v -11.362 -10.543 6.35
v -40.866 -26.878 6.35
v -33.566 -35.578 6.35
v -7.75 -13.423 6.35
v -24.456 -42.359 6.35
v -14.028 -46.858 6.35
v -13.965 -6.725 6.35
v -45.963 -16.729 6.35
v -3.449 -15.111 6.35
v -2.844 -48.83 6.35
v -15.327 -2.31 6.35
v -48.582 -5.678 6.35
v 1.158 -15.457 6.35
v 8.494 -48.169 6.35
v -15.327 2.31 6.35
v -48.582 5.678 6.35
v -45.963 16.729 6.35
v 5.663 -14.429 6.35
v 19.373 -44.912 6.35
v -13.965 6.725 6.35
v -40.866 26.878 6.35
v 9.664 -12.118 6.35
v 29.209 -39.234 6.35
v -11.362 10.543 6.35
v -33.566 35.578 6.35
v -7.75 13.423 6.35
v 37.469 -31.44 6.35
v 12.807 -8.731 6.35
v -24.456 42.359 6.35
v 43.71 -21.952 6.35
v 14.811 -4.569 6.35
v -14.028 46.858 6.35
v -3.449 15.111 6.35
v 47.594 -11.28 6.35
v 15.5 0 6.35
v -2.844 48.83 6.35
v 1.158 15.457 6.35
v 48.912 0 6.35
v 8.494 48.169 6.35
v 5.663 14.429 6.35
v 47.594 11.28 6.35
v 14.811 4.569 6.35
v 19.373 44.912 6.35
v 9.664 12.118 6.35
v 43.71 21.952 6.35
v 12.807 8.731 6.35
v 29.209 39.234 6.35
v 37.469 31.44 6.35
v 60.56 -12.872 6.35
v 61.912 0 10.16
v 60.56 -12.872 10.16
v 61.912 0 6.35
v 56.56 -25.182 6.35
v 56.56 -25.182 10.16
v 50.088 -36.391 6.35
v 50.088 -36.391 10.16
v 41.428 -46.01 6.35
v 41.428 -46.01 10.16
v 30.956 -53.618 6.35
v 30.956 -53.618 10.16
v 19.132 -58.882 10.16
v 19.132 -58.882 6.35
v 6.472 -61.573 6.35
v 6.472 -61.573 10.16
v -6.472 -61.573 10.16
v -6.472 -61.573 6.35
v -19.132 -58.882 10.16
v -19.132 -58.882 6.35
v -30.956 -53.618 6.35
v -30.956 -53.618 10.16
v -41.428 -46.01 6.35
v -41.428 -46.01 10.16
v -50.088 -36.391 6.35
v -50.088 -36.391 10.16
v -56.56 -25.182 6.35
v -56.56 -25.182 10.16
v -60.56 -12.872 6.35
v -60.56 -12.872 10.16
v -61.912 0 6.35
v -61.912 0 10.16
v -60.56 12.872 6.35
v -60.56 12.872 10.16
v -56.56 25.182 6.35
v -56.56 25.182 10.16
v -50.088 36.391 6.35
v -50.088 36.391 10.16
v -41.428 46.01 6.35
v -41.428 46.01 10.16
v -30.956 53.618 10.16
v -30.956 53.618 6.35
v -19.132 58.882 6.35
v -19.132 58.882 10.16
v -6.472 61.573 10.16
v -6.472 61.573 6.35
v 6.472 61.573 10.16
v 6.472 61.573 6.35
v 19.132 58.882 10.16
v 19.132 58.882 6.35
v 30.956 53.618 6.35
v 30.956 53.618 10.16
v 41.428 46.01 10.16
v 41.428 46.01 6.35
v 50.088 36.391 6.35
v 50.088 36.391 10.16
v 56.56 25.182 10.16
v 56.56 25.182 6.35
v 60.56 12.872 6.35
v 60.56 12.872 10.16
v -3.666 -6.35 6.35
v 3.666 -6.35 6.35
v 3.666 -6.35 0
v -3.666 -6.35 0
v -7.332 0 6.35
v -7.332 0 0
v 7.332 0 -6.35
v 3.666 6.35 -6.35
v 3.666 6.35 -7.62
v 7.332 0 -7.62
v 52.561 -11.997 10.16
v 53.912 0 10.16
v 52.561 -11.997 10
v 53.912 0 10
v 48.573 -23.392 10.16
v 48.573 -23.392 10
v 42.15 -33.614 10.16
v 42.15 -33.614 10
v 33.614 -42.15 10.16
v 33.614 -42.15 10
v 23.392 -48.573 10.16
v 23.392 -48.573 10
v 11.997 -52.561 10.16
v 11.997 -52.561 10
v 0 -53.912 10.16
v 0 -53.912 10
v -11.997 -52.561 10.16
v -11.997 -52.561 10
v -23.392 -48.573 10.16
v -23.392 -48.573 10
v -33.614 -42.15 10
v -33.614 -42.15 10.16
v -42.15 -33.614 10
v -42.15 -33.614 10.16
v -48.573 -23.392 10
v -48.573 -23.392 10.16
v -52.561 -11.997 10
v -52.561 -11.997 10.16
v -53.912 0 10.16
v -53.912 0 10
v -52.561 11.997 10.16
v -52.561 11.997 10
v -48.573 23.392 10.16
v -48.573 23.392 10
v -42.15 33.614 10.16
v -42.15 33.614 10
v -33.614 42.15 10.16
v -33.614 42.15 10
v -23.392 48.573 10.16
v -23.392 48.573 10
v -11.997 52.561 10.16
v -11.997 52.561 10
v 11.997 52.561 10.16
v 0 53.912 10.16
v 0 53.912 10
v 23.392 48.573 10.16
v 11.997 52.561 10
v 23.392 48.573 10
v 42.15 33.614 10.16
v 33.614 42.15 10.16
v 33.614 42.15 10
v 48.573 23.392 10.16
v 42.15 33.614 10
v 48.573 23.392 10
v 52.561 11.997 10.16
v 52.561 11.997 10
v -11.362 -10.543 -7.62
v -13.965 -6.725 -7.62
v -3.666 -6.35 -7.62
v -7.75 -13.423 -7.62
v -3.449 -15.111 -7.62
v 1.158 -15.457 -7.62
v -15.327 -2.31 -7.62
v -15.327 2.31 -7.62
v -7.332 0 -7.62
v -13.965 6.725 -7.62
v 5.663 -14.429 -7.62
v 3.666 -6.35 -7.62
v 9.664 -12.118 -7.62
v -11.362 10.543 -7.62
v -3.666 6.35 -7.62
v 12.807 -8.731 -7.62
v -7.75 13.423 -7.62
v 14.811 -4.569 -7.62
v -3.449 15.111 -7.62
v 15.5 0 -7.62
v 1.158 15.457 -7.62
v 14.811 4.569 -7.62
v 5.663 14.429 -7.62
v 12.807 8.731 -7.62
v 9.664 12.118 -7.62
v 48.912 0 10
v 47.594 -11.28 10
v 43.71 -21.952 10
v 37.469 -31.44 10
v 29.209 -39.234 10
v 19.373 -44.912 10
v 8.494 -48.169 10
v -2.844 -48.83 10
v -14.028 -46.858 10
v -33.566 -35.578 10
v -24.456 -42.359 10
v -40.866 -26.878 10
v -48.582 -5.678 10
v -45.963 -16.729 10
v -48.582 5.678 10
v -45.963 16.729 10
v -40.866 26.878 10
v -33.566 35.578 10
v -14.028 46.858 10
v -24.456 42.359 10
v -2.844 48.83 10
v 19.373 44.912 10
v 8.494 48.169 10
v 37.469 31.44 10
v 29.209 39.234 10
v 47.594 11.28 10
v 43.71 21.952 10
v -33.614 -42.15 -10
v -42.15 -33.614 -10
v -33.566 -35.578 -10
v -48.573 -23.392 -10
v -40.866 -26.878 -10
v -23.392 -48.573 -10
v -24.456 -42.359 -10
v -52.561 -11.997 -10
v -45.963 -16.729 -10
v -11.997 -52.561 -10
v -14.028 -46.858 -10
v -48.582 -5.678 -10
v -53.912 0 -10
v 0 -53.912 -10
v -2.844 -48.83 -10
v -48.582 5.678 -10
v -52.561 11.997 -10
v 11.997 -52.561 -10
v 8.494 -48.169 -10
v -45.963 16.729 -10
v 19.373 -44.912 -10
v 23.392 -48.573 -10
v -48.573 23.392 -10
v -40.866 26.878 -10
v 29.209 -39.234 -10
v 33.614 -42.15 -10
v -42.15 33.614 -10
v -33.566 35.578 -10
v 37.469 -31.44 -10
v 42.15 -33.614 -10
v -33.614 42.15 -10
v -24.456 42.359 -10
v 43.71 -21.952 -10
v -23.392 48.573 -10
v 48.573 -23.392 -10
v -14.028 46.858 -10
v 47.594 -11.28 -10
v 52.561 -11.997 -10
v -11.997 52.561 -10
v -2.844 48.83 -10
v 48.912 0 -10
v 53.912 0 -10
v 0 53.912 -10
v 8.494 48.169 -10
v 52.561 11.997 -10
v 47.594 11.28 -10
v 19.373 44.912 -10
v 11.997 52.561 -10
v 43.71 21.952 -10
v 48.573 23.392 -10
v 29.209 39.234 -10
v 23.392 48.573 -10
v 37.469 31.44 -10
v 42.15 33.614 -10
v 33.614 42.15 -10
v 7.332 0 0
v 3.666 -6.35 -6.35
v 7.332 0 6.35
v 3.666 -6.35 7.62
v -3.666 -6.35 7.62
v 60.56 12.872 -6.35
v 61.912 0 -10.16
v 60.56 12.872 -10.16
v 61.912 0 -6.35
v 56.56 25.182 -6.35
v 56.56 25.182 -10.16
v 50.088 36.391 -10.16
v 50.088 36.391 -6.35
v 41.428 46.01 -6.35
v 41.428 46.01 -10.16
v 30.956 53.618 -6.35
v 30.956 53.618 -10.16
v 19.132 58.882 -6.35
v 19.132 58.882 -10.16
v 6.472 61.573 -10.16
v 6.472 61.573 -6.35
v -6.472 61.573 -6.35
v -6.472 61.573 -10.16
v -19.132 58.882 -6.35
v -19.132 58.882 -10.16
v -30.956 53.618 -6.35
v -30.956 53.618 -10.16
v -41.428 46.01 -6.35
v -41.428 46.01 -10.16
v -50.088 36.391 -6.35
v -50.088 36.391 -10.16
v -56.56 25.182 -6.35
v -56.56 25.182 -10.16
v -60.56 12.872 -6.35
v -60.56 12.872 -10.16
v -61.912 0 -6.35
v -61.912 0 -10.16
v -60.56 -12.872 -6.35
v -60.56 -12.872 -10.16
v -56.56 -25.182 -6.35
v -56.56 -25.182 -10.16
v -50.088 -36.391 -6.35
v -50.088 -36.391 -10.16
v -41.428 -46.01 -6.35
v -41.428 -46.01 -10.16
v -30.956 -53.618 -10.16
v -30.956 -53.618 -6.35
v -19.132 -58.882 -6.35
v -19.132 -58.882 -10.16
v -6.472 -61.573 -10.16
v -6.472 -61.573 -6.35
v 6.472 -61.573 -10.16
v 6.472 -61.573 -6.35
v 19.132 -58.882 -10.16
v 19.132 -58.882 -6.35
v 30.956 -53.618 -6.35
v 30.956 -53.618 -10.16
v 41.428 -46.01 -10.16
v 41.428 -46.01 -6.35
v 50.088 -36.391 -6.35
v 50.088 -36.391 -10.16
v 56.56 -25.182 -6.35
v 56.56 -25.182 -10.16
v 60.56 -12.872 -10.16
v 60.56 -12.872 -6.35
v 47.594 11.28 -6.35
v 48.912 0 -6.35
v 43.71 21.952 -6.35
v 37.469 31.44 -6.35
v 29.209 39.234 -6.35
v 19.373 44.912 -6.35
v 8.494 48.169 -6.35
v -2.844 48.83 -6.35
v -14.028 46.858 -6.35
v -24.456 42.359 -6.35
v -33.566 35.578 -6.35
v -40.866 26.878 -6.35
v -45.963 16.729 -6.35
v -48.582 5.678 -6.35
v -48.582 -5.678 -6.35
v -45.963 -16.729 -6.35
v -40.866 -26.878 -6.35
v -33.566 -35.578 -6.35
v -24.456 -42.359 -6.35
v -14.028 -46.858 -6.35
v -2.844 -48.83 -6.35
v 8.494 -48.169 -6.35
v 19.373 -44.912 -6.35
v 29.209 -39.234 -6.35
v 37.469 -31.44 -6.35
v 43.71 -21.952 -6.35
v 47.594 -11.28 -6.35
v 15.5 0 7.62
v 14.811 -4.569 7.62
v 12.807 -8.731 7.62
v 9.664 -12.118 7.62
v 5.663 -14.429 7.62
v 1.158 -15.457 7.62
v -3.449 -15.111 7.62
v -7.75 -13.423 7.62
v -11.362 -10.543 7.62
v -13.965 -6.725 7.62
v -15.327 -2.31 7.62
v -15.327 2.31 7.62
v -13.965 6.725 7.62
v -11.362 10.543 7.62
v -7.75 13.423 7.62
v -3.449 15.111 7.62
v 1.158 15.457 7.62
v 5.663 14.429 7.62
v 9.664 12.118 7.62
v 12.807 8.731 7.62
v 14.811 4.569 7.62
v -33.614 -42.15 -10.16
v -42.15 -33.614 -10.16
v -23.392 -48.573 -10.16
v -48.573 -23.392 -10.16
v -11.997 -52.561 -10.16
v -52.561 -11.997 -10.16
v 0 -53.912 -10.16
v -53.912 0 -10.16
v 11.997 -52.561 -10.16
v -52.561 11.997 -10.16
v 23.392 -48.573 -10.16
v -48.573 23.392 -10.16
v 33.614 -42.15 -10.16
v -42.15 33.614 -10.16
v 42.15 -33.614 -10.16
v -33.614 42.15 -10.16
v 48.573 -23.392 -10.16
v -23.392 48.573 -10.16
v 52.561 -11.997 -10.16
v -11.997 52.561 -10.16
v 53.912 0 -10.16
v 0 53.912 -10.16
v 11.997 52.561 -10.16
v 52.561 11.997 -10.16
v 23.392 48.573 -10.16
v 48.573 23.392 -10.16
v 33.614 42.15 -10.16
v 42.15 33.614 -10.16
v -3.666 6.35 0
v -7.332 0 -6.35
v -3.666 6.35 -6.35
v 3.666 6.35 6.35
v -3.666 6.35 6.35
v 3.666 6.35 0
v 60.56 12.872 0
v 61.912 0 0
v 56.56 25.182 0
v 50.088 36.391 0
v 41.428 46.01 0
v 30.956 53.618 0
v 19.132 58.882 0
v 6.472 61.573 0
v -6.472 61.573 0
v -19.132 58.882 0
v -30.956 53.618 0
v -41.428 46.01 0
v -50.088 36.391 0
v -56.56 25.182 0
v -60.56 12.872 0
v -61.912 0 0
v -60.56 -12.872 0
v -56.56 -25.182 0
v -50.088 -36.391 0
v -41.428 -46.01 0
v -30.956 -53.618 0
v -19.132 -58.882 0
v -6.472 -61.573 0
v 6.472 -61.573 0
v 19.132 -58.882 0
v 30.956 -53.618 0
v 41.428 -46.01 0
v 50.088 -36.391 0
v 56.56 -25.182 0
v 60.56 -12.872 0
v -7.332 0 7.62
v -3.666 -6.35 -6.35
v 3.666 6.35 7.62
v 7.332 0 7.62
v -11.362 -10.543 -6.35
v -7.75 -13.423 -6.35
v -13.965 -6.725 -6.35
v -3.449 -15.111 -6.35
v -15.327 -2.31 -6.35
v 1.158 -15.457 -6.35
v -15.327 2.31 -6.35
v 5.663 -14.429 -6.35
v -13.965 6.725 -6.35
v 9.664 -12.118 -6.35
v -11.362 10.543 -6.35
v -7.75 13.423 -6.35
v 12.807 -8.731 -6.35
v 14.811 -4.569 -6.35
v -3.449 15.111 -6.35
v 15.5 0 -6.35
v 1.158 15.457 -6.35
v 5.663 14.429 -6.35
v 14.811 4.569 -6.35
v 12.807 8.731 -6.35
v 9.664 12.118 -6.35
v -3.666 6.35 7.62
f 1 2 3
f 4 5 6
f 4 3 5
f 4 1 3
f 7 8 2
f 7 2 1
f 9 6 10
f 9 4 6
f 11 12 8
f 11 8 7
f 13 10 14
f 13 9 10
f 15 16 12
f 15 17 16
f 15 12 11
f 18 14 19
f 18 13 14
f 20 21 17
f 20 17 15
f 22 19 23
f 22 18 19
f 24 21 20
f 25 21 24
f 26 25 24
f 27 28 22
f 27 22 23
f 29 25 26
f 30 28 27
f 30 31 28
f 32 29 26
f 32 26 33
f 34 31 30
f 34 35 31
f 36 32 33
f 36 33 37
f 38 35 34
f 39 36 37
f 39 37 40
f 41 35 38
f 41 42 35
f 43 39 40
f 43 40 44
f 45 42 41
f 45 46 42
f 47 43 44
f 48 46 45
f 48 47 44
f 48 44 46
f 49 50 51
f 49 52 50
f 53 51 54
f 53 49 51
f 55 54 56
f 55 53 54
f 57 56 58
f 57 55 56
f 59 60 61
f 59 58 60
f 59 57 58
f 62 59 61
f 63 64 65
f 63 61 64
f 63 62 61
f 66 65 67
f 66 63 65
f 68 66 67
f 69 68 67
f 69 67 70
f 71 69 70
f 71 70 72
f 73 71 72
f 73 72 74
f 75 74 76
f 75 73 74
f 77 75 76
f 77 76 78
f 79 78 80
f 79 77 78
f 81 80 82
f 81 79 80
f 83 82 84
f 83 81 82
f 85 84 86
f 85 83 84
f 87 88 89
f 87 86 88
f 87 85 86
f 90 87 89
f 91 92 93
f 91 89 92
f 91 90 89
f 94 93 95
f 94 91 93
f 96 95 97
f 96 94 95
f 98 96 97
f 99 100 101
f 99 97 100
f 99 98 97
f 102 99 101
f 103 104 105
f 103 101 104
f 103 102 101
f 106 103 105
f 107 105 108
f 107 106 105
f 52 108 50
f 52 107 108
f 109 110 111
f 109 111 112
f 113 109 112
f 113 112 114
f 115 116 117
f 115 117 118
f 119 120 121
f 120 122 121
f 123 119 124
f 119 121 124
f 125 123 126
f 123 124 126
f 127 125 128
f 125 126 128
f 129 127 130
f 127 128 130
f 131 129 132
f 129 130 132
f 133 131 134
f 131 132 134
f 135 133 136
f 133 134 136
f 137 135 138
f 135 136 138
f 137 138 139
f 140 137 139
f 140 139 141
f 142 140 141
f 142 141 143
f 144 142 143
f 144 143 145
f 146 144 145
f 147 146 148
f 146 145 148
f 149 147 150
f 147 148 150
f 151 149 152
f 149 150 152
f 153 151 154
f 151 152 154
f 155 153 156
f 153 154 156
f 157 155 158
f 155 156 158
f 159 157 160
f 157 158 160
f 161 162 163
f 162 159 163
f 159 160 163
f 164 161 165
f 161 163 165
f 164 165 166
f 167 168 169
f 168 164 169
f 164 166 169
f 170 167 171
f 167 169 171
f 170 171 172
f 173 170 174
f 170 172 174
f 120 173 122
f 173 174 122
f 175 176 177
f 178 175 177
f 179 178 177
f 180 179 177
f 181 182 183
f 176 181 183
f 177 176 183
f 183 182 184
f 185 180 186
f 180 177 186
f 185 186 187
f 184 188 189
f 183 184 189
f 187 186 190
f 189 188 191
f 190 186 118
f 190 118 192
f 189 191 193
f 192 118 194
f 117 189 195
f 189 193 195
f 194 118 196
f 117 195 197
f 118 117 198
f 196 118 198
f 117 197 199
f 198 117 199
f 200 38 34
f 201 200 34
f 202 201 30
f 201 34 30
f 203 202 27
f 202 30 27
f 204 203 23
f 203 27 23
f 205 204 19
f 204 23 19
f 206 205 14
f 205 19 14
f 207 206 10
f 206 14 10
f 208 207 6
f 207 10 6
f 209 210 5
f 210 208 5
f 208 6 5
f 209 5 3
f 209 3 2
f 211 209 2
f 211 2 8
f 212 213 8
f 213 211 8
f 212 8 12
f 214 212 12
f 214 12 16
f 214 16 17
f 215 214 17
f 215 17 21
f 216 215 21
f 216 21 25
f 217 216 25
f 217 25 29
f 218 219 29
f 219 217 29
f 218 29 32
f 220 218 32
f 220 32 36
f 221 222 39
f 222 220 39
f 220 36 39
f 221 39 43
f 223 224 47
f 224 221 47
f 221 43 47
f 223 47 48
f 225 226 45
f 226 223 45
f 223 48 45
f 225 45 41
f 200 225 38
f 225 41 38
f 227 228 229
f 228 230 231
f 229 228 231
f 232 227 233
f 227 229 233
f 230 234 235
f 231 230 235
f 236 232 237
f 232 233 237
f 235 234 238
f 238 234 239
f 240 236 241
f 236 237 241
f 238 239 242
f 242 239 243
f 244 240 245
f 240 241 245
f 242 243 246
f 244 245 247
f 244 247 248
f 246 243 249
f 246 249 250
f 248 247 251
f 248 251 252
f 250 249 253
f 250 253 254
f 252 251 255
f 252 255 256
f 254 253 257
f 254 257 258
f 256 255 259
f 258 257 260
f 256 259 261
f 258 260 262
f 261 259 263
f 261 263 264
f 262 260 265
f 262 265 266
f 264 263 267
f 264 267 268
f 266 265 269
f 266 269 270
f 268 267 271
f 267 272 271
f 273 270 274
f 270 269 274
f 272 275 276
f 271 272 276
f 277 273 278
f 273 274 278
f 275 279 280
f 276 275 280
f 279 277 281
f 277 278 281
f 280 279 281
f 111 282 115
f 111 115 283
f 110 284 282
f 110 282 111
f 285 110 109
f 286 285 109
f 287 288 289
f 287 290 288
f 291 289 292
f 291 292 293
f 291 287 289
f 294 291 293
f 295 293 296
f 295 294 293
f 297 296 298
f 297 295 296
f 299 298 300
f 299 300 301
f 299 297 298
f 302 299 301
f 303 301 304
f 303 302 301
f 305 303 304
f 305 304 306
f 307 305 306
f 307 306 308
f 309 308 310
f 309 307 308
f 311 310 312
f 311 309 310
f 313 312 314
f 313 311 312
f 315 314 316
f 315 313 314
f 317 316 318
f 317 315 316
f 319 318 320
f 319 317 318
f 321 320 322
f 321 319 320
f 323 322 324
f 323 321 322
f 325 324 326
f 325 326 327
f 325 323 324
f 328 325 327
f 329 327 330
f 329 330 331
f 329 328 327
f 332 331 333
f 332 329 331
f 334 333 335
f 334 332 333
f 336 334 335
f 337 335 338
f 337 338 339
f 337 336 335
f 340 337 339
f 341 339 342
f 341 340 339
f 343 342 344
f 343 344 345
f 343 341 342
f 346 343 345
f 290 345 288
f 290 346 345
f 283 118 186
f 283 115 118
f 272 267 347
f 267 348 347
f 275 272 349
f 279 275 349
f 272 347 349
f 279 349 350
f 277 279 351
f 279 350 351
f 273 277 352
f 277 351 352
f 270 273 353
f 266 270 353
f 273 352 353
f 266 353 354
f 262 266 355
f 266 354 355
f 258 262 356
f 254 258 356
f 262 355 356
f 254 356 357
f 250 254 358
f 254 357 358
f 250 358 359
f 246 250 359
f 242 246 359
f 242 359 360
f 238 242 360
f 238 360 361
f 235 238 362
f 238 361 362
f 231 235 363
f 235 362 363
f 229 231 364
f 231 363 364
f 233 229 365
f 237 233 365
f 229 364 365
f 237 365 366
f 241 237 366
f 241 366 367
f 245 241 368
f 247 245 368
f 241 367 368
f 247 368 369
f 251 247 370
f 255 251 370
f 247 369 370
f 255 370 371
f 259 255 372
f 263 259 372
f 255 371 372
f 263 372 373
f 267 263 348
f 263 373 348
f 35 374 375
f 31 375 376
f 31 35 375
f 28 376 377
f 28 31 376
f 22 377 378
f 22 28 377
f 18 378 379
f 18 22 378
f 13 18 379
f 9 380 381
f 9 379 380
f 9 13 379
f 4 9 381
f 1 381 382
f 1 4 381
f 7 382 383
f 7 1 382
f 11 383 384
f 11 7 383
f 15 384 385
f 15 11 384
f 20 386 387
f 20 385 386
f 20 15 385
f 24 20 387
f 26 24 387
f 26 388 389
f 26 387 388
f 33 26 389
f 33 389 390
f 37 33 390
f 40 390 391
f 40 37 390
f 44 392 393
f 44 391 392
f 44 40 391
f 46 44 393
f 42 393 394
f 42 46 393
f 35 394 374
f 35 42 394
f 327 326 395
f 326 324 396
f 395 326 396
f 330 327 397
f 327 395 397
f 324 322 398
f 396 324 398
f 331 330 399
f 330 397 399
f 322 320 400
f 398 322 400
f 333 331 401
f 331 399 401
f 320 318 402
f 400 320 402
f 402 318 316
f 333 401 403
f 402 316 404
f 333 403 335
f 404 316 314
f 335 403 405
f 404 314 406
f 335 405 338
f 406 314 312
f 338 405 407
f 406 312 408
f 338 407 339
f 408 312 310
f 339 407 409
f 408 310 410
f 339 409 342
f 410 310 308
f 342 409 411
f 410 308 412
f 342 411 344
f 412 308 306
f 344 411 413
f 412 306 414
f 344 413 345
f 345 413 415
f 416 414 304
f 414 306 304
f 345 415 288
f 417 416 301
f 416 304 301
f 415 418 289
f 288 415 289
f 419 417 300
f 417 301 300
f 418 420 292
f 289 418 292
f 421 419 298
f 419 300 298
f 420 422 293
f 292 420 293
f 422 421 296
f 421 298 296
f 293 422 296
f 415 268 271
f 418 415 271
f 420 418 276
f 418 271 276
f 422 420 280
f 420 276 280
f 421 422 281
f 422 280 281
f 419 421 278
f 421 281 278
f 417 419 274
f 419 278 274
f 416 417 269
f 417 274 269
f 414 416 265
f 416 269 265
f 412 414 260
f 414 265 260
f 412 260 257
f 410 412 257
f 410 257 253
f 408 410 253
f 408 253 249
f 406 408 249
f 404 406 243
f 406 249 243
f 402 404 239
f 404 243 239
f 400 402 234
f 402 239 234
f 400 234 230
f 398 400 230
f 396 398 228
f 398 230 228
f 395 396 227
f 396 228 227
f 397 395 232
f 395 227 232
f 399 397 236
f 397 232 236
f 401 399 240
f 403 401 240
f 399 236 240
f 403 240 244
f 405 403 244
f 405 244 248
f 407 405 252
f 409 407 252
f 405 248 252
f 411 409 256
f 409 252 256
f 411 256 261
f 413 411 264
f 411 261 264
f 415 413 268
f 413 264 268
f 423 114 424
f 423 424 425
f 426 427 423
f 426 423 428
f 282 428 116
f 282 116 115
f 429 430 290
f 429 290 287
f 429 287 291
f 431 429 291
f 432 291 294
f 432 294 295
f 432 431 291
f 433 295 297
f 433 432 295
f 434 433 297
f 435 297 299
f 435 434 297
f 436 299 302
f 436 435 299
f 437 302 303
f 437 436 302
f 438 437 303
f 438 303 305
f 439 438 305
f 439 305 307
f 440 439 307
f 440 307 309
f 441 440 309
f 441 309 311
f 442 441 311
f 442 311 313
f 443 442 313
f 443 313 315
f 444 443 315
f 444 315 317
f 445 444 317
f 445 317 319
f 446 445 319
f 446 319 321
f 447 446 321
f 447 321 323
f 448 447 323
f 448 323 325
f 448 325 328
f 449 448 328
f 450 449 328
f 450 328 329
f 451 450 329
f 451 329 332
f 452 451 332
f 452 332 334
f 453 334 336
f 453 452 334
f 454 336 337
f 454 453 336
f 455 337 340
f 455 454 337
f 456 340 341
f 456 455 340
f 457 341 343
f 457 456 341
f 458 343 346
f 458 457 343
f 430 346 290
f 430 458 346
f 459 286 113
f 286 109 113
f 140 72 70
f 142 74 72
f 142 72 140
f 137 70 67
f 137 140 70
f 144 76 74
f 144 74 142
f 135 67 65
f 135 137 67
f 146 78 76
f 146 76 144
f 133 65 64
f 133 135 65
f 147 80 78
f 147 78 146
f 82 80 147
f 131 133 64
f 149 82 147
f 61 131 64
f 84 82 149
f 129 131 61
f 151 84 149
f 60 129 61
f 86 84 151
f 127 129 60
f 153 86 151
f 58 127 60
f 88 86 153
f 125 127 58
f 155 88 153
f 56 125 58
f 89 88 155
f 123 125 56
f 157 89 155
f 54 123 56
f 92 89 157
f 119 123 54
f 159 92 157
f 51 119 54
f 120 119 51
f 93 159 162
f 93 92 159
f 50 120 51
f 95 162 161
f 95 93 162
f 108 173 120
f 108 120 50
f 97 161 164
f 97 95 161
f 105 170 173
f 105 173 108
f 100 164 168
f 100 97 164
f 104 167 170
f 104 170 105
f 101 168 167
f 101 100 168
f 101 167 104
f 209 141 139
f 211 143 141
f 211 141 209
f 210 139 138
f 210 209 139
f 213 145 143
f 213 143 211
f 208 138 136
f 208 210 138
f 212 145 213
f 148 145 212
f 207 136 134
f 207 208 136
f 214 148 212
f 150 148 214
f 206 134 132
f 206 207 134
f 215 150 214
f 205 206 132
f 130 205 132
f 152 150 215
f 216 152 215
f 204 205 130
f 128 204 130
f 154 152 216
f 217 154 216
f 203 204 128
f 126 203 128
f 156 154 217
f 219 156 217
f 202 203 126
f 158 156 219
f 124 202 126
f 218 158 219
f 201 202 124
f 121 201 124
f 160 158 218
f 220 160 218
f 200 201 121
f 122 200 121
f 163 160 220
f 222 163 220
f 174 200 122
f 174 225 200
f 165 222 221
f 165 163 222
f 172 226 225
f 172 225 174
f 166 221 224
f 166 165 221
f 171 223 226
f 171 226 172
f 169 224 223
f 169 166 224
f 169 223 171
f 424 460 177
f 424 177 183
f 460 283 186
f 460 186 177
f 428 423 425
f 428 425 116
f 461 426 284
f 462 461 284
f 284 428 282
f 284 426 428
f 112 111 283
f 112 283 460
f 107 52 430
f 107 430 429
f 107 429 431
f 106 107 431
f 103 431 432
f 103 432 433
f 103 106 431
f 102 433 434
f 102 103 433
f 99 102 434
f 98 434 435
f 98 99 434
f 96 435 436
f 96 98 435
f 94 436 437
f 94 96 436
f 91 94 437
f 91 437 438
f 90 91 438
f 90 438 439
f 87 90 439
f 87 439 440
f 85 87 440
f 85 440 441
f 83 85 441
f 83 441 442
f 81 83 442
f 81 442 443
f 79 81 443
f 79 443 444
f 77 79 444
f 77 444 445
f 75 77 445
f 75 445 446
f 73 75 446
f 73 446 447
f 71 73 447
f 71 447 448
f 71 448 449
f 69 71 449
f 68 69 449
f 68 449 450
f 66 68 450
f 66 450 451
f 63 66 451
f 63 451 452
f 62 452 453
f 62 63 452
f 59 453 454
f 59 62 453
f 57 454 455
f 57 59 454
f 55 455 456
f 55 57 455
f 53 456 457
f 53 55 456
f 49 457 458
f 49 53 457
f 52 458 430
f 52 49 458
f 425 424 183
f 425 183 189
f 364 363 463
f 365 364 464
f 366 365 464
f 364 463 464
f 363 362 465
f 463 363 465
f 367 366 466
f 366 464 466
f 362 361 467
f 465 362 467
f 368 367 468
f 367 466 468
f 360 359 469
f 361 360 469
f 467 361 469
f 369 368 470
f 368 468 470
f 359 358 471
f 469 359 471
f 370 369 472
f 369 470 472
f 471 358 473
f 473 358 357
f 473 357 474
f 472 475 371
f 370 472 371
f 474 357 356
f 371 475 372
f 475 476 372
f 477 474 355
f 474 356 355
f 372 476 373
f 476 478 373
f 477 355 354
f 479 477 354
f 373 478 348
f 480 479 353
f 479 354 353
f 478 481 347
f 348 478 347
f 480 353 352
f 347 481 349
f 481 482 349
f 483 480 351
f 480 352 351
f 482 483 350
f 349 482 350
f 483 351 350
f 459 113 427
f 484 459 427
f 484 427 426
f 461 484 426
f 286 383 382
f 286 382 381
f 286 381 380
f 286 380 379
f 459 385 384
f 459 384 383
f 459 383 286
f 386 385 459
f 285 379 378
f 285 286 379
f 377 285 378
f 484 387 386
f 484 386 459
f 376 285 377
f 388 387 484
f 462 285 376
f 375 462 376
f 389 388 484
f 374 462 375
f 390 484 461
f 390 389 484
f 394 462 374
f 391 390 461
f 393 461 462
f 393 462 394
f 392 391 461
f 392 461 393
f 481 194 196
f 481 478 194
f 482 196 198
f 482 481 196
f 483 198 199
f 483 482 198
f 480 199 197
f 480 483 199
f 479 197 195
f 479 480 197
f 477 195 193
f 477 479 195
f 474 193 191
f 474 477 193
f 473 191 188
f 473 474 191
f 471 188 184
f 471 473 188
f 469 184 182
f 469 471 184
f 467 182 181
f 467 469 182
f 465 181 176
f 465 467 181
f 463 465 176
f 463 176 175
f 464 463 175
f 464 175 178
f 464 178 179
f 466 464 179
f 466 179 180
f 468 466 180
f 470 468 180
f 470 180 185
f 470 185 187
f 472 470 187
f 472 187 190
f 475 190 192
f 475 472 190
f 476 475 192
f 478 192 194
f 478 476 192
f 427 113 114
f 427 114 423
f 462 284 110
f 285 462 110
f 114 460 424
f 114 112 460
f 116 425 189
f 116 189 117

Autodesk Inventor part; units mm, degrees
ref_plane "YZ Plane" through (0, 0, 0) normal (1, 0, 0) x (0, 1, 0)
ref_plane "XZ Plane" through (0, 0, 0) normal (0, 1, 0) x (-1, 0, 0)
ref_plane "XY Plane" through (0, 0, 0) normal (0, 0, 1) x (1, 0, 0)
sketch "Sketch1" plane through (0, 0, 0) normal (0, 0, 1) x (1, 0, 0)
  circle A0 centre (0, 0) radius 53.9125
  circle A1 centre (0, 0) radius 61.9125
  line L0 (-3.6662, 6.35) -> (3.6662, 6.35)
  line L1 (3.6662, 6.35) -> (7.3323, 0)
  line L2 (7.3323, 0) -> (3.6662, -6.35)
  line L3 (3.6662, -6.35) -> (-3.6662, -6.35)
  line L4 (-3.6662, -6.35) -> (-7.3323, 0)
  line L5 (-7.3323, 0) -> (-3.6662, 6.35)
  circle A2 centre (0, 0) radius 48.9125
  circle A3 centre (0, 0) radius 15.5
  point P0 (0, -6.35)
  dimension "d0" = 8
  dimension "d2" = 12.7
  dimension "d7" = 123.825
  dimension "d8" = 13
  dimension "d13" = 31
extrude "Extrusion1" add sketch "Sketch1" along normal mid plane 12.7 contours A0 | A1 | A2 | A3
extrude "Extrusion2" add sketch "Sketch1" along normal mid plane 20.32 contours A1
extrude "Extrusion3" add sketch "Sketch1" along normal blind 10 contours A0
extrude "Extrusion4" add sketch "Sketch1" against normal blind 10 contours A0
extrude "Extrusion5" add sketch "Sketch1" along normal mid plane 15.24 contours A3
properties part number "hjul"
